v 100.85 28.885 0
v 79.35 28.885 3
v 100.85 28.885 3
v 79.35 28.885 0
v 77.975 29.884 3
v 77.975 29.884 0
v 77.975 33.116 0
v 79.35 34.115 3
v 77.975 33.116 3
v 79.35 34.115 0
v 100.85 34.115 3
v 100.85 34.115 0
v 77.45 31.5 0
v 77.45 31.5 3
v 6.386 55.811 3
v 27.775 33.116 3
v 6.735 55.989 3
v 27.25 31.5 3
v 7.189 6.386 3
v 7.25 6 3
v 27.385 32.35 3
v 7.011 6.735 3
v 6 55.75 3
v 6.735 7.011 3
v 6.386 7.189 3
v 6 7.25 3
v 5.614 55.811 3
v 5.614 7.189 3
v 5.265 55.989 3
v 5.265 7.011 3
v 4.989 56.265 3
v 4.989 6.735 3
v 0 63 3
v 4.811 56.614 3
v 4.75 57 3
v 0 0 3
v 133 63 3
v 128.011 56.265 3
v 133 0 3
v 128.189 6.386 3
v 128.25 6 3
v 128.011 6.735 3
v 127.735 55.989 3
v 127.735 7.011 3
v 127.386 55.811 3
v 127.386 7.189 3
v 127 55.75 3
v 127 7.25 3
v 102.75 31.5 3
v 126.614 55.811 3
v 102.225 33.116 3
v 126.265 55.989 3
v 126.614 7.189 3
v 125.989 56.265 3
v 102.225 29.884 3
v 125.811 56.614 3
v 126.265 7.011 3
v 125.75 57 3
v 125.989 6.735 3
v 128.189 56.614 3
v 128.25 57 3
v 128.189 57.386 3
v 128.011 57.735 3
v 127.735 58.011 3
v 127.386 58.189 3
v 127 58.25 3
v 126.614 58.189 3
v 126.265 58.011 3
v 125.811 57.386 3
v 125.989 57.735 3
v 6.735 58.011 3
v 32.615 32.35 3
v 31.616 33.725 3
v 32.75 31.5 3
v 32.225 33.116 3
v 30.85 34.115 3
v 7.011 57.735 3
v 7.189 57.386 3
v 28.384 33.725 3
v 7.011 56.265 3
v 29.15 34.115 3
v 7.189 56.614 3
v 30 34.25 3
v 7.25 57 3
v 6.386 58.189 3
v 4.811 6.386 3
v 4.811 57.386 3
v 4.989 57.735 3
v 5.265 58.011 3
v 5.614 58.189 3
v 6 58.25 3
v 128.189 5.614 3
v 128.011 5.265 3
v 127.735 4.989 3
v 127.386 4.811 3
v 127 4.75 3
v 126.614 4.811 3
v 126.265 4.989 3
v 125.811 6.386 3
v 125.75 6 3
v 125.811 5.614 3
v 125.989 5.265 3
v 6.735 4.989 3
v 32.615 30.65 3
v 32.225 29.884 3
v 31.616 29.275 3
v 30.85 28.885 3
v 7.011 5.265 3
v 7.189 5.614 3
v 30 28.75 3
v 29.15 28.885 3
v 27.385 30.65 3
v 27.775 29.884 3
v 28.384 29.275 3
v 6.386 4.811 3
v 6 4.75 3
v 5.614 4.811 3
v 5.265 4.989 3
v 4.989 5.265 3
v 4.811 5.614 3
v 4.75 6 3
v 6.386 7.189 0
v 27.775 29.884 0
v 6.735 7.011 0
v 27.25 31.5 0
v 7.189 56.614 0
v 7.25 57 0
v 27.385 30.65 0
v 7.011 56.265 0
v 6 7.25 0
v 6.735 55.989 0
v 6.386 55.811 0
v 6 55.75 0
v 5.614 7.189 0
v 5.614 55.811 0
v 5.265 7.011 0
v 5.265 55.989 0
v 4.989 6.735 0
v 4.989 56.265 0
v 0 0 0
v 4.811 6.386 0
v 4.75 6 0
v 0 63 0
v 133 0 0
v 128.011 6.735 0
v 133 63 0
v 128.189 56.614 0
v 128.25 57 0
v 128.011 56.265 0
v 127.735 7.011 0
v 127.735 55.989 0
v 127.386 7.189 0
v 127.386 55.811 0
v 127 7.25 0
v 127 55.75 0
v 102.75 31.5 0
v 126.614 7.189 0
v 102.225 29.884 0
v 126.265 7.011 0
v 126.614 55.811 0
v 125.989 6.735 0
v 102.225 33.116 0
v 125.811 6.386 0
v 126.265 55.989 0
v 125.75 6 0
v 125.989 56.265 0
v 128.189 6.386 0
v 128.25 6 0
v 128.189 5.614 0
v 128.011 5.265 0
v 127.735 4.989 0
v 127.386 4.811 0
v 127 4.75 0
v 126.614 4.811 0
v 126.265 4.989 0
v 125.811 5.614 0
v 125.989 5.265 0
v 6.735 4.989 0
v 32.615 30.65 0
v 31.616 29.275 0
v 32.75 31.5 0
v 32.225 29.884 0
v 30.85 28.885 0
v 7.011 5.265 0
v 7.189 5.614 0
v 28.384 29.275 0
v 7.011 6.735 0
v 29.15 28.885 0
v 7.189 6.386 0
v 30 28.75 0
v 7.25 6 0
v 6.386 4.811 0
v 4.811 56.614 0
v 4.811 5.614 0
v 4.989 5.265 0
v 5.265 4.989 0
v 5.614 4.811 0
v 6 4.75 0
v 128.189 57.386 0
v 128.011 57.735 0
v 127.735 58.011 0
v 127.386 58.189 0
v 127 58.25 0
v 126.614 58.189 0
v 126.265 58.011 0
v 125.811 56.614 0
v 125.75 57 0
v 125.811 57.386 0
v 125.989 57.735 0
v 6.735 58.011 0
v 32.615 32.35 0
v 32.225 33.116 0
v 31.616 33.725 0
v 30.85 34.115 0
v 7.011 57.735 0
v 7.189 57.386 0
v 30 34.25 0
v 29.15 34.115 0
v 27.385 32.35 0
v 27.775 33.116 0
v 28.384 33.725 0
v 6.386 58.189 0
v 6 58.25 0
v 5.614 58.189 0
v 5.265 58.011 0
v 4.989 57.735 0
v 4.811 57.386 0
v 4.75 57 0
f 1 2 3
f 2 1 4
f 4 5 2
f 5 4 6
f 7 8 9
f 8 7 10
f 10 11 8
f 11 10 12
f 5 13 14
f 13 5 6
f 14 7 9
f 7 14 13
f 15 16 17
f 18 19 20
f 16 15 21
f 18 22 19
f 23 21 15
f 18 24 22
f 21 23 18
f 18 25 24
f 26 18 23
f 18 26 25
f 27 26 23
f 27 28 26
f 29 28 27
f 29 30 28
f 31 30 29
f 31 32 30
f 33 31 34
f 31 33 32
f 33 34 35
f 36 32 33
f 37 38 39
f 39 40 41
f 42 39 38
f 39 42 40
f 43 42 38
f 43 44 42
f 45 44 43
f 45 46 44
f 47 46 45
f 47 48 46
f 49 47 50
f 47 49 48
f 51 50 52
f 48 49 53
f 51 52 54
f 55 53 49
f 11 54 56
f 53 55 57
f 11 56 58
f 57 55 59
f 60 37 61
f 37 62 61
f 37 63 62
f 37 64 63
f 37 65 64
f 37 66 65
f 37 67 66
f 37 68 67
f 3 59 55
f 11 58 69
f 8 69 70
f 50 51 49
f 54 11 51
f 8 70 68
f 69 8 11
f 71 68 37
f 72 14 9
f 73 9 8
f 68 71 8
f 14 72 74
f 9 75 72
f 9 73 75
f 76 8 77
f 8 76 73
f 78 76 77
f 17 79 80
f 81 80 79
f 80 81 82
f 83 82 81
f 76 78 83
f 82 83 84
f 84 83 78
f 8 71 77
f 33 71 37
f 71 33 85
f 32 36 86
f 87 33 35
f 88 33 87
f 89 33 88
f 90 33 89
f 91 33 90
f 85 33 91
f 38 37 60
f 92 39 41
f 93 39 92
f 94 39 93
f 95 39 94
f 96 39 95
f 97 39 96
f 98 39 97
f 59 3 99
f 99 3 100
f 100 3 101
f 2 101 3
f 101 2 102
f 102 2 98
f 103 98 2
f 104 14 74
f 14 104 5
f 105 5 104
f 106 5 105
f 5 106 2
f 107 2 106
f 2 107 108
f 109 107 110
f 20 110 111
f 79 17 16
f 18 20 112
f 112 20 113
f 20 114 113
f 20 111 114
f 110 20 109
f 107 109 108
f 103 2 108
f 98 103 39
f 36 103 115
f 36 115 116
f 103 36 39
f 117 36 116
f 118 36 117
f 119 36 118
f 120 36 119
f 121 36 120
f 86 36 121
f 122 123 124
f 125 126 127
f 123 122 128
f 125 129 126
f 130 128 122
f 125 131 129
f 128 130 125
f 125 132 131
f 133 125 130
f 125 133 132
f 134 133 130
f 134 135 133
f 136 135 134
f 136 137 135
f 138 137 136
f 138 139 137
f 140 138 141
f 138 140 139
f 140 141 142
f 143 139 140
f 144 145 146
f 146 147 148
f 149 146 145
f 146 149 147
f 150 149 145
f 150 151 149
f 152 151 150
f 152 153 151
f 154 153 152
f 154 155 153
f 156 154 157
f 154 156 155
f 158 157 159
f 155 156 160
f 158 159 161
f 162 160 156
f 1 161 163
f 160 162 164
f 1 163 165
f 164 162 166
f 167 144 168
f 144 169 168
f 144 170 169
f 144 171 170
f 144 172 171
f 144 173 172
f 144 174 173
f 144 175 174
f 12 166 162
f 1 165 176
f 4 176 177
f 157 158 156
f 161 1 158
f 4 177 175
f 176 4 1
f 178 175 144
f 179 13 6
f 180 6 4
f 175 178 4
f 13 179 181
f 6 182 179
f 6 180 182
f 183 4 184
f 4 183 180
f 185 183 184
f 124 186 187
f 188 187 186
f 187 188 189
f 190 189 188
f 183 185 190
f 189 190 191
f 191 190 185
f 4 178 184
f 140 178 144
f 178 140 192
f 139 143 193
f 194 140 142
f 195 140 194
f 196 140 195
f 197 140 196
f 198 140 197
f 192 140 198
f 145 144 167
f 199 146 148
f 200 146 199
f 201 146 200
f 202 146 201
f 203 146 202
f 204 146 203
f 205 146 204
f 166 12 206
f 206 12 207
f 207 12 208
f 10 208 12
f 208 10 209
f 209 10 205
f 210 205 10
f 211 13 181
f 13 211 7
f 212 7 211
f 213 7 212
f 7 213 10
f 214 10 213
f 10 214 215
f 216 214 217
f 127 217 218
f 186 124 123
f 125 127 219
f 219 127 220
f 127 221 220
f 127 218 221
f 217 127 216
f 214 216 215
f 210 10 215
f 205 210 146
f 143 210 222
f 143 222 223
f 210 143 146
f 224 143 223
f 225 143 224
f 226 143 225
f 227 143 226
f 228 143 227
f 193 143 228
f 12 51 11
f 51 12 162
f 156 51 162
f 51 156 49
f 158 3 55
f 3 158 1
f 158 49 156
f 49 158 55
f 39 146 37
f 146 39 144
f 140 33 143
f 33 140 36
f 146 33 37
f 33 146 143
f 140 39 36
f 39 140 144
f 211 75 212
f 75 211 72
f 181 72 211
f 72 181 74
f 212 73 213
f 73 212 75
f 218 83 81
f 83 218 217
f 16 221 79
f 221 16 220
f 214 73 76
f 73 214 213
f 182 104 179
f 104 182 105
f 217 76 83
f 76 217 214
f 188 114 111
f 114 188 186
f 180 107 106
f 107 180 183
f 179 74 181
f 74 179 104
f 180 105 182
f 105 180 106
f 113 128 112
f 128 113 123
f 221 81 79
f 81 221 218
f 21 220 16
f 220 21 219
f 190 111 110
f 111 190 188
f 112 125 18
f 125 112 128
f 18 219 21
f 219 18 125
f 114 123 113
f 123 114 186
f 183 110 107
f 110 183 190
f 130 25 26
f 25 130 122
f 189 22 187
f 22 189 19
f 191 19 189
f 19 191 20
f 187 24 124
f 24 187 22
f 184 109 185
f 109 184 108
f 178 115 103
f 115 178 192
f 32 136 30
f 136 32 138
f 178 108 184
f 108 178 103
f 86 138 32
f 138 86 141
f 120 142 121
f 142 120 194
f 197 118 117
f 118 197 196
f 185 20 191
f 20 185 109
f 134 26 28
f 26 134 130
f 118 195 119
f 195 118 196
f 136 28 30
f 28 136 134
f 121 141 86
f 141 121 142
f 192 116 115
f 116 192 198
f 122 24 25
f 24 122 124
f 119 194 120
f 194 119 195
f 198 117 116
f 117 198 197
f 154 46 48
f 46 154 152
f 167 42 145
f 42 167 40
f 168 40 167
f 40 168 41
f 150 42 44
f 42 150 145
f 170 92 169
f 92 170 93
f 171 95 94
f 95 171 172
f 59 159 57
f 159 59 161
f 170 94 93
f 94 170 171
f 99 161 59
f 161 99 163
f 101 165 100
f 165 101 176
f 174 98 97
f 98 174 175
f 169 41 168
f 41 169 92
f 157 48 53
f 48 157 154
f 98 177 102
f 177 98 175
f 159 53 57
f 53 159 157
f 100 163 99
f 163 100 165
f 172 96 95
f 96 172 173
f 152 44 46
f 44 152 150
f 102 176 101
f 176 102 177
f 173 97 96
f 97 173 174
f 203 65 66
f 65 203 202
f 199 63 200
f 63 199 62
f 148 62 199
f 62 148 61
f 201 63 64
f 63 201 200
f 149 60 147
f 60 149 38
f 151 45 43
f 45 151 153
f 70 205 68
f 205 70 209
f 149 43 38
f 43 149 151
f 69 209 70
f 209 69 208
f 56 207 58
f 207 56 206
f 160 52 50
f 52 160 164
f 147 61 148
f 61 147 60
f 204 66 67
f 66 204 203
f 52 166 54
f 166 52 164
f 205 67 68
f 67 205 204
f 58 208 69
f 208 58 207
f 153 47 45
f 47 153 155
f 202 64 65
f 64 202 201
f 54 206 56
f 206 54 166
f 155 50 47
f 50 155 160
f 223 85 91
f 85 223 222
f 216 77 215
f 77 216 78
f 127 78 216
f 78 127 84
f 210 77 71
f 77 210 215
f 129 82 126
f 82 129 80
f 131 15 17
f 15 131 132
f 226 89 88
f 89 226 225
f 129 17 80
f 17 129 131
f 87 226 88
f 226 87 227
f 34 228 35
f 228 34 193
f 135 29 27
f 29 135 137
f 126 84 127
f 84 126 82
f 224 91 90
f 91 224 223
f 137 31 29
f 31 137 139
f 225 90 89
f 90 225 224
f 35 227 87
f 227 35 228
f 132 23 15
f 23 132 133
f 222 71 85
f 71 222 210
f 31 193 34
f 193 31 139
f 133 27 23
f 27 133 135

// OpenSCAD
difference(){
    cube([133, 63, 3]);
    translate([30, 31.5, 0]){
        cylinder(3, d=5.5, $fn = 20);
    }
    for (a =[1:100]){
        translate([80+a*20/100, 31.5, 0]){
            cylinder(3, d=5.5, $fn = 10);
        }
    }
    
    // Befestigungslöcher für Hauptkörper
    translate([6,6,0]){
        cylinder(3, d=2.5, $fn=20);
    }
    translate([133-6,6,0]){
        cylinder(3, d=2.5, $fn=20);
    }
    translate([133-6,63-6,0]){
        cylinder(3, d=2.5, $fn=20);
    }
    translate([6,63-6,0]){
        cylinder(3, d=2.5, $fn=20);
    }
    
}
